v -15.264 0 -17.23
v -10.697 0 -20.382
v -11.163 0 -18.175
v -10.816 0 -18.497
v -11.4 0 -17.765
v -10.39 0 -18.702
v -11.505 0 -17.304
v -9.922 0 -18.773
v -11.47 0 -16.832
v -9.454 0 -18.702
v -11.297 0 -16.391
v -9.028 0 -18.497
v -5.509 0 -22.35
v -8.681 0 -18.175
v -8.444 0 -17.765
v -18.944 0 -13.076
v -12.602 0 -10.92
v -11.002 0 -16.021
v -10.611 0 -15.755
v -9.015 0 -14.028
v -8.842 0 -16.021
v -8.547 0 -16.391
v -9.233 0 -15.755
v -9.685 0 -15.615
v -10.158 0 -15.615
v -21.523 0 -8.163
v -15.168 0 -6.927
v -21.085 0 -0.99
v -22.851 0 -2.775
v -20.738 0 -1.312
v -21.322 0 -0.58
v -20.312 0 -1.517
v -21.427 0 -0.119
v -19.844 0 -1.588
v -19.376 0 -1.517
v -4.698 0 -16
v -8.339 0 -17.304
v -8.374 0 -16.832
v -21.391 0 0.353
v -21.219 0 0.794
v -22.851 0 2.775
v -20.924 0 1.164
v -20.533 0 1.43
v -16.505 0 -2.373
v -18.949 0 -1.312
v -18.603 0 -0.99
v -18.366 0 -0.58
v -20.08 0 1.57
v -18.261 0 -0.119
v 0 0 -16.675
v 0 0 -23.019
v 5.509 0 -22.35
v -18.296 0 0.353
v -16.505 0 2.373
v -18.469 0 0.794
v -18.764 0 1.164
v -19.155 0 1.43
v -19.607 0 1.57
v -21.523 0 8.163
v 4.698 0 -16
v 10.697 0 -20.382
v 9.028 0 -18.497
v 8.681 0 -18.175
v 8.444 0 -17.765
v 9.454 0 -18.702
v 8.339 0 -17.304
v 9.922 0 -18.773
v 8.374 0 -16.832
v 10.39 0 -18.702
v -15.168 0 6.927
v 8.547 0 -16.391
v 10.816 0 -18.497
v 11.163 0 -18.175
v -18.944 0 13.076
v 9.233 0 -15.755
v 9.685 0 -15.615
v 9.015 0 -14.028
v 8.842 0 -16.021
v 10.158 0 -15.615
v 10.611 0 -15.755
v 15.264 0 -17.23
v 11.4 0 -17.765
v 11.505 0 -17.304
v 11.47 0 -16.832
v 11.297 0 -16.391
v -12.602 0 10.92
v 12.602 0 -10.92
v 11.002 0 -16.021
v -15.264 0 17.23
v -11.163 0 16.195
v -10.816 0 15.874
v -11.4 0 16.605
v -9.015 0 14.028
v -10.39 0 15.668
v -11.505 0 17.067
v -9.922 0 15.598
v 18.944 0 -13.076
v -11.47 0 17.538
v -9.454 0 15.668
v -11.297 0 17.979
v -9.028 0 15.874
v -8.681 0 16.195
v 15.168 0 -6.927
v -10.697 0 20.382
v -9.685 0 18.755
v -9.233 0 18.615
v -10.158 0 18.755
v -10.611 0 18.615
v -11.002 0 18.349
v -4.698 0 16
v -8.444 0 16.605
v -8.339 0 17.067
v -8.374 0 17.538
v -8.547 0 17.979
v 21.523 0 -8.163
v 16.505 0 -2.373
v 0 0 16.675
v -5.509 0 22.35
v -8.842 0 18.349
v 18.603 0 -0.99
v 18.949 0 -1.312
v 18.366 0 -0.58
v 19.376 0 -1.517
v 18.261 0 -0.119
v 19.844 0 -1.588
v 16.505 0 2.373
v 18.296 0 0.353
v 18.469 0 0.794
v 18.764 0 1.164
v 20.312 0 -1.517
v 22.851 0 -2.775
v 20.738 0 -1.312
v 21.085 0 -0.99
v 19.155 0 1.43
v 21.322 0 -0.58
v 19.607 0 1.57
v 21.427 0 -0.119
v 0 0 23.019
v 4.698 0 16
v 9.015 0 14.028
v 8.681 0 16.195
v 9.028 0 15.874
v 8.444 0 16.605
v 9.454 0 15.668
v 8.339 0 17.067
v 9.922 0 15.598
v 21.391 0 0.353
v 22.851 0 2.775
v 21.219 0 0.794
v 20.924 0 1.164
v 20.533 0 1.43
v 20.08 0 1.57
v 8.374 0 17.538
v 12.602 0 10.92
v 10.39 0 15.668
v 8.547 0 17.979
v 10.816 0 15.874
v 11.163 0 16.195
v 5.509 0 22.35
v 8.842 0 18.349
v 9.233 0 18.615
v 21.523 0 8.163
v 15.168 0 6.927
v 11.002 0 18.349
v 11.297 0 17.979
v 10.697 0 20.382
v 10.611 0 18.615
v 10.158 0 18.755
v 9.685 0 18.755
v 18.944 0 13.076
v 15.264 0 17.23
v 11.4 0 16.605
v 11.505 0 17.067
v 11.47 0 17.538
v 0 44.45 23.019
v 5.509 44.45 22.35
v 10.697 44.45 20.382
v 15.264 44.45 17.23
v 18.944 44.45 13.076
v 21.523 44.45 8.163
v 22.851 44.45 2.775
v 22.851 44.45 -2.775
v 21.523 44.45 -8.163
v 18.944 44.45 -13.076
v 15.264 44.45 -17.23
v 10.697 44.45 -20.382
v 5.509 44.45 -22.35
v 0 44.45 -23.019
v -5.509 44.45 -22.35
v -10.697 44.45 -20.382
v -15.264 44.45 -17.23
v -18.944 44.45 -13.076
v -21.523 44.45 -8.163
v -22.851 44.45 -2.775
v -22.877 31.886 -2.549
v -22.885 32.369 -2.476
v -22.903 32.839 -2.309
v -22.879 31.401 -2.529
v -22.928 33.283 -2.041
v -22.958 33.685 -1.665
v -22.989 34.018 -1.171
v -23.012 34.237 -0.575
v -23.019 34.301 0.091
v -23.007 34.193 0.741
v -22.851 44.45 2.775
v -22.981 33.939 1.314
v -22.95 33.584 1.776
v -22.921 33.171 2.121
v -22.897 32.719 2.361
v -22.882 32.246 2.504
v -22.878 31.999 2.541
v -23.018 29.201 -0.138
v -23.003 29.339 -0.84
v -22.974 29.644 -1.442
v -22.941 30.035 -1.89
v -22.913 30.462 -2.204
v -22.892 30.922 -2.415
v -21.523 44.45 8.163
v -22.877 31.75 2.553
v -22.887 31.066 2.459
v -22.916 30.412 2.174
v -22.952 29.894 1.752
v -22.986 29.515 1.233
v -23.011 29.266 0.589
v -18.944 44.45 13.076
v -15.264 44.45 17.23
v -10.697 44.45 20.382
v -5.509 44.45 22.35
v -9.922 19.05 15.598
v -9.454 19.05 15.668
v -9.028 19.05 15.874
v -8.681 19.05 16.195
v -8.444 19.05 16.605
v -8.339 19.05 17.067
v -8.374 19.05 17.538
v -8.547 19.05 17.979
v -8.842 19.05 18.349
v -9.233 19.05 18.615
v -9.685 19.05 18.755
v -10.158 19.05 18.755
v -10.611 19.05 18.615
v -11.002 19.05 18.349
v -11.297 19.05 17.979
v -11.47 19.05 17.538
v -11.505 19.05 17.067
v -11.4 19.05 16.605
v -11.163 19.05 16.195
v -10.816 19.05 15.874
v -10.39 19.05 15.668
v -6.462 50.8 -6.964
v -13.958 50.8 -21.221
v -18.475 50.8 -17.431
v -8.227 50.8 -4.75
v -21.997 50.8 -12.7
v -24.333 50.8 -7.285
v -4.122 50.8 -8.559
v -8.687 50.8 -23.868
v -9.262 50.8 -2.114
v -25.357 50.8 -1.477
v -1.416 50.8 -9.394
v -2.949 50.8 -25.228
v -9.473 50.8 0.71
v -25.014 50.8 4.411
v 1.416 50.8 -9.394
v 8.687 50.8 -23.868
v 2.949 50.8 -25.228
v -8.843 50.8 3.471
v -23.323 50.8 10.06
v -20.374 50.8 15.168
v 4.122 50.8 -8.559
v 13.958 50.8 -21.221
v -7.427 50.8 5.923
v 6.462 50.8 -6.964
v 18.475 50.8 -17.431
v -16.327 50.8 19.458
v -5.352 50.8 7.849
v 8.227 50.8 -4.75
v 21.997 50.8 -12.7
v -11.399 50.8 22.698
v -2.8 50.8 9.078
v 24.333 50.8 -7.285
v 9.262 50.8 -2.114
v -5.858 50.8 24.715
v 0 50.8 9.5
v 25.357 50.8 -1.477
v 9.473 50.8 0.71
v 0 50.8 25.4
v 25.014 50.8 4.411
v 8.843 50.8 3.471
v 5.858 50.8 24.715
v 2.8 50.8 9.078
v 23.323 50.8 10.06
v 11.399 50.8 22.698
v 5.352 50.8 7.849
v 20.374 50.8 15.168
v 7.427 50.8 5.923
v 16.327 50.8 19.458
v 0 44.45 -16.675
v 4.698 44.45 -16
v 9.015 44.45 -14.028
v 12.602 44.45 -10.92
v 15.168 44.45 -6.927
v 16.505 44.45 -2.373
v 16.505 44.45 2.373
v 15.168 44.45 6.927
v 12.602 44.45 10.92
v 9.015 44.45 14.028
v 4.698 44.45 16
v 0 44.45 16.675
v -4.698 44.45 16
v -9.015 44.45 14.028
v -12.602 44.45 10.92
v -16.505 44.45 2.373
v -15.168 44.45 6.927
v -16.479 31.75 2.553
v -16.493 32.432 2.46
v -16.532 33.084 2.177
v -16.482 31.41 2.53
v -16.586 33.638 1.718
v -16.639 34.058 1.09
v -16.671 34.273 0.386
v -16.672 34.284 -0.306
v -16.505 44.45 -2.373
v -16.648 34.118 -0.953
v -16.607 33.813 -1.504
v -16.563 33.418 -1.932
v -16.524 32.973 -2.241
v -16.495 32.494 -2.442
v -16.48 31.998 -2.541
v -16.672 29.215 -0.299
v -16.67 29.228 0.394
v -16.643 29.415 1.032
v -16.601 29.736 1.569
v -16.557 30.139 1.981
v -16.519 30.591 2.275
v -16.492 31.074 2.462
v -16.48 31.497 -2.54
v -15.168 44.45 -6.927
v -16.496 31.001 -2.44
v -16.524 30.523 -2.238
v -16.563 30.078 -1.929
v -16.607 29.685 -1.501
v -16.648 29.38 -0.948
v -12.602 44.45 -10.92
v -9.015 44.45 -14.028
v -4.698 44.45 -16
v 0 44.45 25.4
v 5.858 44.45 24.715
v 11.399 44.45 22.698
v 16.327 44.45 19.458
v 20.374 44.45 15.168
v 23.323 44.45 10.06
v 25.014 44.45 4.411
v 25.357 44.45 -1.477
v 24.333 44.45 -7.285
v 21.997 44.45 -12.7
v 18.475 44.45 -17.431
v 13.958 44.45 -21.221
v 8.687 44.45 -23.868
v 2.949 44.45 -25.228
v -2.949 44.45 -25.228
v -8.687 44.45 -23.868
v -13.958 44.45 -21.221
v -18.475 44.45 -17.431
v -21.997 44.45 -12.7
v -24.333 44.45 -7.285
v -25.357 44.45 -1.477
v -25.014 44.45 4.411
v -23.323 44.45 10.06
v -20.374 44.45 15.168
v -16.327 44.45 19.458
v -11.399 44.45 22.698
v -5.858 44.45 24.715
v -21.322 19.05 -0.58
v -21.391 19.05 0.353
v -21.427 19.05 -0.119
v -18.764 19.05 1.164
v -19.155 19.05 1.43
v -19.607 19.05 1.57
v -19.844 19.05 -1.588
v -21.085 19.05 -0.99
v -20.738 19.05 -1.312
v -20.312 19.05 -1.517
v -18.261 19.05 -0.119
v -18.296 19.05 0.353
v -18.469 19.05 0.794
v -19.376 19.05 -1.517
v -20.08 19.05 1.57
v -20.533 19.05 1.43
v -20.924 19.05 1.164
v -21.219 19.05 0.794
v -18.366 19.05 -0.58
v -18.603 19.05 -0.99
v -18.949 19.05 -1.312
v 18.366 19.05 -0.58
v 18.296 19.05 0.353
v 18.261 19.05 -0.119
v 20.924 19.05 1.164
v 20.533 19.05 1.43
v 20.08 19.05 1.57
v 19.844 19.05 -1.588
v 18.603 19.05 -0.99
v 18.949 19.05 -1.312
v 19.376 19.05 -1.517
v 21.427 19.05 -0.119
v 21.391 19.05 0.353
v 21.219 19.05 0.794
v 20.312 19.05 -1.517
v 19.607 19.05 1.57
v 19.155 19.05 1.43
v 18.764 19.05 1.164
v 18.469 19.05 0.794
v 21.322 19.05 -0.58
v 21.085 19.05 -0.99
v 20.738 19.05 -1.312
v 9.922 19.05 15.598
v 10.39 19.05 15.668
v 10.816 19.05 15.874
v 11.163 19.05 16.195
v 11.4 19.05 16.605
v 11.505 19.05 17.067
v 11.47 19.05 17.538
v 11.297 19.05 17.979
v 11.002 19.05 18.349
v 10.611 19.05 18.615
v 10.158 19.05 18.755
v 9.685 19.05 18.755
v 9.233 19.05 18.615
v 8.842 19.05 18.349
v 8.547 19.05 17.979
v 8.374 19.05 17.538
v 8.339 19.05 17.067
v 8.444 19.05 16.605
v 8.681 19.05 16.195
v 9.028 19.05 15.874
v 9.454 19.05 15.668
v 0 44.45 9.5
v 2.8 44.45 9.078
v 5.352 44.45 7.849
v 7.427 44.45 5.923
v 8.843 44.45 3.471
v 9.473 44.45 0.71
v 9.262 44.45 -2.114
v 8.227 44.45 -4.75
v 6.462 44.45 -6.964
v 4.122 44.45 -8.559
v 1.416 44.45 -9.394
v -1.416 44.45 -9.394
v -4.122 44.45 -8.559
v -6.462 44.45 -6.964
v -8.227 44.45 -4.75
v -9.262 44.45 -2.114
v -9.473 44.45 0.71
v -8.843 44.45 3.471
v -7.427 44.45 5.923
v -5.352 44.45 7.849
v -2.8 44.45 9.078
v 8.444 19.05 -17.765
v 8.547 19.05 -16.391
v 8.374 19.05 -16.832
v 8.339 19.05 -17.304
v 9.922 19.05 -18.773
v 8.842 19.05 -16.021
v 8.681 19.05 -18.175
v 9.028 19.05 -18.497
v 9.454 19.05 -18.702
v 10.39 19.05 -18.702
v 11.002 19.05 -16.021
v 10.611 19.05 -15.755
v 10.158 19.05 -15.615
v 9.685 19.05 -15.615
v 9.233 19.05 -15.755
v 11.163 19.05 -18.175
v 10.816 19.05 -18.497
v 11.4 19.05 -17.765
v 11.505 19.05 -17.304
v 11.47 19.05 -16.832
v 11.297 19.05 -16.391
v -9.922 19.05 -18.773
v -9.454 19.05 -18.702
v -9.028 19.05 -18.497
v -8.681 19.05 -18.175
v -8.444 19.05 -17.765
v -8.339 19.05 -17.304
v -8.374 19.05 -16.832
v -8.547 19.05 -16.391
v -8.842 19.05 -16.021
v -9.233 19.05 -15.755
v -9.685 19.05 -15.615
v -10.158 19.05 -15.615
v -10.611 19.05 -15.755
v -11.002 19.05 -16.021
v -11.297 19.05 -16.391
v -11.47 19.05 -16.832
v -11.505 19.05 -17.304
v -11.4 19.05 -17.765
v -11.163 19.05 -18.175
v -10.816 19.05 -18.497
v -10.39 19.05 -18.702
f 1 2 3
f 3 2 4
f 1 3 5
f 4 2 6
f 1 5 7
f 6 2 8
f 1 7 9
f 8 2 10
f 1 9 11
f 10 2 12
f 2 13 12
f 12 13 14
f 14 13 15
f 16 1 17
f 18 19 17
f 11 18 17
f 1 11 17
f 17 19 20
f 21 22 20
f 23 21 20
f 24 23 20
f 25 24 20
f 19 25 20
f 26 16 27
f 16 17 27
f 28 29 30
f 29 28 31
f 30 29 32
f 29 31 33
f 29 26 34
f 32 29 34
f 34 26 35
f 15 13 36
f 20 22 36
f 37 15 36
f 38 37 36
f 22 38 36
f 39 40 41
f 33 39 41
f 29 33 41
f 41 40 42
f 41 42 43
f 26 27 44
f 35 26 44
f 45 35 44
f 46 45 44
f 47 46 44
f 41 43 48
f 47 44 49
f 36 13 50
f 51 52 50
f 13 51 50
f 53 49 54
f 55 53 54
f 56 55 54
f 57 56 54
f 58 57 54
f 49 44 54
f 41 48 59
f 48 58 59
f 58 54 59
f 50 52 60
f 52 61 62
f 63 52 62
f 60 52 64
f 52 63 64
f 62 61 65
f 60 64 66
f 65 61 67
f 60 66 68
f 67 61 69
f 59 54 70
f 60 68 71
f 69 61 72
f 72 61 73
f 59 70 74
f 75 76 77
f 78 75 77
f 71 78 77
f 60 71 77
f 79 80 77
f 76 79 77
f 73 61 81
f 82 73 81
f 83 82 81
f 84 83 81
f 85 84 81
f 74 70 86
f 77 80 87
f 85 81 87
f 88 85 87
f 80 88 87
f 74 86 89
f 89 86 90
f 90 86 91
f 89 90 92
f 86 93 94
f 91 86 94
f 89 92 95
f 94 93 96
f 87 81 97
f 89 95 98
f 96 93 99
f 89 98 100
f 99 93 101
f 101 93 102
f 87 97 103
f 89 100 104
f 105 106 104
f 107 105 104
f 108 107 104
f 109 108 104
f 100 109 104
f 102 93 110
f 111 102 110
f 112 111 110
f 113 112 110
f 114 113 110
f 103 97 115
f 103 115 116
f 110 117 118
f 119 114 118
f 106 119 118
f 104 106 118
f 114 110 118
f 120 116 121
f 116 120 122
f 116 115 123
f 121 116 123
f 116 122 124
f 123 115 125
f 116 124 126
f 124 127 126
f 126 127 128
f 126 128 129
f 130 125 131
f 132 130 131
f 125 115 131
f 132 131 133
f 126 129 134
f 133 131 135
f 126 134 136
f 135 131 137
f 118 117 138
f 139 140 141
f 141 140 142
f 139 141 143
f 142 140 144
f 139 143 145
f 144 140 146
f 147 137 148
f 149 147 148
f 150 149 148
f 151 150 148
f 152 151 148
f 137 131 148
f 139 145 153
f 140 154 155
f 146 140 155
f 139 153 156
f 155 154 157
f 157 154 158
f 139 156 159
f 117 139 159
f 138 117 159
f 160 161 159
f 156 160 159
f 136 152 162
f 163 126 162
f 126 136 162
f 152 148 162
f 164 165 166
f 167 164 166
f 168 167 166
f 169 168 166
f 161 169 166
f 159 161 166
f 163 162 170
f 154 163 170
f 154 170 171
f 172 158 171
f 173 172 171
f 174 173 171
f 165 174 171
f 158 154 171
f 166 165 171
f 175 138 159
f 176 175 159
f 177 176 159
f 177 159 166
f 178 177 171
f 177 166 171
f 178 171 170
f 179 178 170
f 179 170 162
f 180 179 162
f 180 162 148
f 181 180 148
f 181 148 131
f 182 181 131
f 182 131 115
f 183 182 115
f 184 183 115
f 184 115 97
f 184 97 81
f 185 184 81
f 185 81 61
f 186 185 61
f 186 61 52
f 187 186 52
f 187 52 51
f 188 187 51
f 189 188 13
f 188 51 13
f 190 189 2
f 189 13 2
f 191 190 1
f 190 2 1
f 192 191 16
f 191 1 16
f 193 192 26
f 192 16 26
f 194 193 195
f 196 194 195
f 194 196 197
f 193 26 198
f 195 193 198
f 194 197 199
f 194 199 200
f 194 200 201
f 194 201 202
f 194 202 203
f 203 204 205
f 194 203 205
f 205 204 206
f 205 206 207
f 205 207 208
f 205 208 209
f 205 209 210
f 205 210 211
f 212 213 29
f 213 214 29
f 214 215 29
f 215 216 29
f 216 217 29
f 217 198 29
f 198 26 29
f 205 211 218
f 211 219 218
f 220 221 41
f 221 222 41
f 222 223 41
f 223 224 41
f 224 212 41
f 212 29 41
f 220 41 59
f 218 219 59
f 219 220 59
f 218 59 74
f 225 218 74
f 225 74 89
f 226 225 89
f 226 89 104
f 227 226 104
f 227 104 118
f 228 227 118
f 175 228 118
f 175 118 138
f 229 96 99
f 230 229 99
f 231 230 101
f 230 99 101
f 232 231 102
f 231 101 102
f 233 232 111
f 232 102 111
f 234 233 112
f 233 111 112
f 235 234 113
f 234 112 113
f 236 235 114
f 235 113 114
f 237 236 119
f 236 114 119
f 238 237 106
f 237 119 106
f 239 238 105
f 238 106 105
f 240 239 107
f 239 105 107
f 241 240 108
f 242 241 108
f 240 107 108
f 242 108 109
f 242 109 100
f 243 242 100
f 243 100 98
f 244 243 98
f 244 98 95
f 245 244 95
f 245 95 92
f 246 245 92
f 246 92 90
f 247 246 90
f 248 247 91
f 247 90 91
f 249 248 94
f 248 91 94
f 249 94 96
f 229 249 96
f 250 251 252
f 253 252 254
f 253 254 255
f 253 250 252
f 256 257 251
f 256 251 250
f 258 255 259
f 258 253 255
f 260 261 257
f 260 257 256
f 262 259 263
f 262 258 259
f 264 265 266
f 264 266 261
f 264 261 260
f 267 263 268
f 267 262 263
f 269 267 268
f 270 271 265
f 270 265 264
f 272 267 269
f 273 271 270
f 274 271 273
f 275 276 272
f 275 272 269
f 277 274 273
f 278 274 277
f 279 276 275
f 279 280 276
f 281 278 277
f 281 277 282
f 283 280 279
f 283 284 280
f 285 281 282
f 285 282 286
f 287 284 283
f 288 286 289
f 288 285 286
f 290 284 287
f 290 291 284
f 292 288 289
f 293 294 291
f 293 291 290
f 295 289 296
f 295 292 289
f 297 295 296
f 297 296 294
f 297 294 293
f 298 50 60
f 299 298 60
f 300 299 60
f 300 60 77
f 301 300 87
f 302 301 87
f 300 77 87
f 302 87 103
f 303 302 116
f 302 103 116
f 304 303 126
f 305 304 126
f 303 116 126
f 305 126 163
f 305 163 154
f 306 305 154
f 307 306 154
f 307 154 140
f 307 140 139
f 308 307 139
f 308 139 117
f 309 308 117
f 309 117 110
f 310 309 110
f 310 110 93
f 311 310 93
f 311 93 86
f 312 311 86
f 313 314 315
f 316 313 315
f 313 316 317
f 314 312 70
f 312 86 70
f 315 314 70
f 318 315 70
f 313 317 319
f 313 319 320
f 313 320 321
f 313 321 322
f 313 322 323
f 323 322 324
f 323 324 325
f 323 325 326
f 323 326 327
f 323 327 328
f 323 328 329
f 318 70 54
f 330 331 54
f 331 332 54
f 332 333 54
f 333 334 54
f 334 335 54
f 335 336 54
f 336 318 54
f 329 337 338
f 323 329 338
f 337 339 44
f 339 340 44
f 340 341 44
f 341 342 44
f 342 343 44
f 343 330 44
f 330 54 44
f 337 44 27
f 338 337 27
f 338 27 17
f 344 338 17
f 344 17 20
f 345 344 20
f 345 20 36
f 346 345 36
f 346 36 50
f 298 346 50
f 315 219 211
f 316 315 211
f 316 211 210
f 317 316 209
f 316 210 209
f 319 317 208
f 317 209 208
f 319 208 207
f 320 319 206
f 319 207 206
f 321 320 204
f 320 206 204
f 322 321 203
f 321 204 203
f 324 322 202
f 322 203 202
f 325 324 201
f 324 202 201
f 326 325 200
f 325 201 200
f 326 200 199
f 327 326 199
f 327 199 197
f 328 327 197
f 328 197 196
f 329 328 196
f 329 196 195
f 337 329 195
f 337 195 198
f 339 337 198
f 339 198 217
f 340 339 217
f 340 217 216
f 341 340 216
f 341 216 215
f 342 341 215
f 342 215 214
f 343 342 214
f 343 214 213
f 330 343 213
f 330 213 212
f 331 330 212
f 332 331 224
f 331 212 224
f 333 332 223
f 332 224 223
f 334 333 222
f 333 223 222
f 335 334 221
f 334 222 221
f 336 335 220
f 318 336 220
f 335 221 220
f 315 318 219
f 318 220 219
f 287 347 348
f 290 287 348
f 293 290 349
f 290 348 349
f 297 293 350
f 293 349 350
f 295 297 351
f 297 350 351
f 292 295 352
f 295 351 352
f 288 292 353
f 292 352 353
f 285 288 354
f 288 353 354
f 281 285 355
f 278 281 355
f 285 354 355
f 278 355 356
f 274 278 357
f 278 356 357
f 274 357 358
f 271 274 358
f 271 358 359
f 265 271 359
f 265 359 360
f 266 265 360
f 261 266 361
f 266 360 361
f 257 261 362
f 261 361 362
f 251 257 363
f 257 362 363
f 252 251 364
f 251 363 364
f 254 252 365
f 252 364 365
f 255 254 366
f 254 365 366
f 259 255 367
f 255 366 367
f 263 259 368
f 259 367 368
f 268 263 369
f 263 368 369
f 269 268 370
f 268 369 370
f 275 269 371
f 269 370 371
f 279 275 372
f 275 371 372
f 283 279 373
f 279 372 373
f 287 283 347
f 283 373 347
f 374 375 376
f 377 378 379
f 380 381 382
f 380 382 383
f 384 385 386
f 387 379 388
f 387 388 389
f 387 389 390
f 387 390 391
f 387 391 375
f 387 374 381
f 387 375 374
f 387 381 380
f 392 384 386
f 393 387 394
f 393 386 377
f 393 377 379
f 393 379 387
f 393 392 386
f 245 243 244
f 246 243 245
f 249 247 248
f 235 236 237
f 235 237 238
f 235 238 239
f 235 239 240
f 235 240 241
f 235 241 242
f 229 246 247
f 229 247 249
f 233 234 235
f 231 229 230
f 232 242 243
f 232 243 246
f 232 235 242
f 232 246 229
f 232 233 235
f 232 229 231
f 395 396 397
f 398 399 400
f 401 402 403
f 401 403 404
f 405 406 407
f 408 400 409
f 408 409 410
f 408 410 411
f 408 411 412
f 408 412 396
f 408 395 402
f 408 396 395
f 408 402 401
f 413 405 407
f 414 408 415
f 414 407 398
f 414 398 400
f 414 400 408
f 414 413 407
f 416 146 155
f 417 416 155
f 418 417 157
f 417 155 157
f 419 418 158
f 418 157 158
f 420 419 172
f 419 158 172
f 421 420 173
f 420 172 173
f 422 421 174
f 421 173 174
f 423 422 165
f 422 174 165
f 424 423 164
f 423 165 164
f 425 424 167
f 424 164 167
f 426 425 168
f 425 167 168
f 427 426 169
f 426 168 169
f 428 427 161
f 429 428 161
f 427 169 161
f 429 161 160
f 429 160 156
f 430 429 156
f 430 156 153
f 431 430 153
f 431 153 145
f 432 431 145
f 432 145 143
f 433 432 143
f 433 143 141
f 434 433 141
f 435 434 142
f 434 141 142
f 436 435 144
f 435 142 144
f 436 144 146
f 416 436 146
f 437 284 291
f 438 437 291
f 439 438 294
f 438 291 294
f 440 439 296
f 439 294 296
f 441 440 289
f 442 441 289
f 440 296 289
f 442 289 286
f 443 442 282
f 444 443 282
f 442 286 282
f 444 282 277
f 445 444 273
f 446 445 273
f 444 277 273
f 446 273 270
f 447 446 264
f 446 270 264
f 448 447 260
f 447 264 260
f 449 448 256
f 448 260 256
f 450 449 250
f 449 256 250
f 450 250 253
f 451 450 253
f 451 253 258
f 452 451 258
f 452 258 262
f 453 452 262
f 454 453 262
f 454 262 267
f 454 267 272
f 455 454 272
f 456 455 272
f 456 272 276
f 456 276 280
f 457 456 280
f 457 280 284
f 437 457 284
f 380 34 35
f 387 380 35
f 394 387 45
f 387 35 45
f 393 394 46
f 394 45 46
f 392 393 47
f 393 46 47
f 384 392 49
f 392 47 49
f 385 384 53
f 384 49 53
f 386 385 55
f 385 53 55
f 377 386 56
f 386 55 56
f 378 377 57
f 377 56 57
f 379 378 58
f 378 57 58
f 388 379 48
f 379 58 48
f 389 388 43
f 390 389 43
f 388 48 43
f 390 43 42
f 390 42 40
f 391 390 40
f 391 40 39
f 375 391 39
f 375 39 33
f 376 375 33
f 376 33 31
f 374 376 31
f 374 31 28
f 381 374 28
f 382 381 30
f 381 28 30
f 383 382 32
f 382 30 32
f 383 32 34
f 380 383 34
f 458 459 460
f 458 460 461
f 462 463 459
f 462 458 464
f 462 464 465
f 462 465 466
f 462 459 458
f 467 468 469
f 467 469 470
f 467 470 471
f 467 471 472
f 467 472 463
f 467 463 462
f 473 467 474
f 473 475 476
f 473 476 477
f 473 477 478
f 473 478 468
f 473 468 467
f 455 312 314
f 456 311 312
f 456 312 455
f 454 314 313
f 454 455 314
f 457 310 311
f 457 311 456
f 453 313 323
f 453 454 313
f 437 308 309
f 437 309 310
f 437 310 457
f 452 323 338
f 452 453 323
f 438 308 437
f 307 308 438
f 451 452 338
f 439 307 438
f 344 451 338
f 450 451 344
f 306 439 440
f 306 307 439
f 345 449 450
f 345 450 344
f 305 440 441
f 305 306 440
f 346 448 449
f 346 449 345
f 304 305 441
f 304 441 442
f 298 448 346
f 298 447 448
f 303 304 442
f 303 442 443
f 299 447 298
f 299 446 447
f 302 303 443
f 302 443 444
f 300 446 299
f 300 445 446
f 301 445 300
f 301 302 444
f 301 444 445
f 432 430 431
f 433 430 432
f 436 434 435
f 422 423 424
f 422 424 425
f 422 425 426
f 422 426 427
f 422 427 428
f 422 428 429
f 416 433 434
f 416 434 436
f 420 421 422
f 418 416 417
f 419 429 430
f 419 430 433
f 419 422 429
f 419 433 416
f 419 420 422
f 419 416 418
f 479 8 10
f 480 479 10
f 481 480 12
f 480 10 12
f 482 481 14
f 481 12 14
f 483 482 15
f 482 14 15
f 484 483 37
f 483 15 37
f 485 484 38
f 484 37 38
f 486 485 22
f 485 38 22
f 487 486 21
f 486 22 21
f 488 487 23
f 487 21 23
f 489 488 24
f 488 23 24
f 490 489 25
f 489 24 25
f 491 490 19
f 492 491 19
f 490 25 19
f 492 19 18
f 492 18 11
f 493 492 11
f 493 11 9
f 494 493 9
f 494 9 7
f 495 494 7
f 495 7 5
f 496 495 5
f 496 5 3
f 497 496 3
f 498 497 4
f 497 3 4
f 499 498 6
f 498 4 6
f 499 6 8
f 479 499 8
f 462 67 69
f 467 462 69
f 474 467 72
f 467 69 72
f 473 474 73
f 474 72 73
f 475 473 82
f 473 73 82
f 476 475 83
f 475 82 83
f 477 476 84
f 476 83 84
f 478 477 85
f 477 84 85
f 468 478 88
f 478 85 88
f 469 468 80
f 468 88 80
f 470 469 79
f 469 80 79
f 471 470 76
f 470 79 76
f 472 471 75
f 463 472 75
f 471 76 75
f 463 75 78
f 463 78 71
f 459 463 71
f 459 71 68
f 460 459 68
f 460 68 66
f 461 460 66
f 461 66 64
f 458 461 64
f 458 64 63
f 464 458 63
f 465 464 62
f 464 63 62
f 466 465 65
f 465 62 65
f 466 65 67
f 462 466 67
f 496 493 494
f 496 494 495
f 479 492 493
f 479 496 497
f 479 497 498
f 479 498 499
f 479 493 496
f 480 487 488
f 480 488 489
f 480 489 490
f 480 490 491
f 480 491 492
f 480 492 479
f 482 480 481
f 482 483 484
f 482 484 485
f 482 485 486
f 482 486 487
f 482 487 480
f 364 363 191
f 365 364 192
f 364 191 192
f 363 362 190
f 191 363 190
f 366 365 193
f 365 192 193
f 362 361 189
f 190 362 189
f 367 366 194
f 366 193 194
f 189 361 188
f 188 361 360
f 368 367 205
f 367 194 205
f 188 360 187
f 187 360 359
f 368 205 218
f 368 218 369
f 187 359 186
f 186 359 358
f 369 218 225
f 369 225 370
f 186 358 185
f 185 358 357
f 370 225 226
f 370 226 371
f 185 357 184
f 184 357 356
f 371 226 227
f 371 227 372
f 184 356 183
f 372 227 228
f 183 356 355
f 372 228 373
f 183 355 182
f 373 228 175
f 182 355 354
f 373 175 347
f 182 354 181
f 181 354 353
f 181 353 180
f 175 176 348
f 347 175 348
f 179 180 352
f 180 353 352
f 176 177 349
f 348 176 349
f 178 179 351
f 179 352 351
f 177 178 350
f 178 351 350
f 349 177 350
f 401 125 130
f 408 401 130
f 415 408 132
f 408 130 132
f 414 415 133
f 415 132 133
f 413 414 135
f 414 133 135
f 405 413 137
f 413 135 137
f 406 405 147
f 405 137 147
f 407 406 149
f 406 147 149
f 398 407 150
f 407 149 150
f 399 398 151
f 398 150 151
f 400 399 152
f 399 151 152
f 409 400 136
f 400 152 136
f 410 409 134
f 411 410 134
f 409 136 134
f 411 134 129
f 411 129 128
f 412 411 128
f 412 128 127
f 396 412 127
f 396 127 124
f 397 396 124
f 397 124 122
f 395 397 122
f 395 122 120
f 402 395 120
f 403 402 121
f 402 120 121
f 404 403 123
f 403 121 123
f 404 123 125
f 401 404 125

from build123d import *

# Parameters (mm, degrees)
SKETCH1_R                        = 23.01875
BOSS_EXTRUDE1_DEPTH              = 44.45
SKETCH2_R                        = 25.4
BOSS_EXTRUDE2_DEPTH              = 6.35
SKETCH3_R                        = 9.5
CUT_EXTRUDE1_DEPTH               = 63.217039467
SKETCH4_R                        = 16.6751
CUT_EXTRUDE2_DEPTH               = 44.45
SKETCH5_R                        = 1.5875
CUT_EXTRUDE3_DEPTH               = 19.05
TAP_DRILL_FOR_1_4_20_TAP1_REACH  = 76.634
TAP_DRILL_FOR_1_4_20_TAP1_BORE_R = 2.5527


with BuildPart() as part:
    # Sketch1 → Boss-Extrude1 (new body)
    with BuildSketch(Plane(origin=(0, 0, 0), x_dir=(1, 0, 0), z_dir=(0, 1, 0))):
        with Locations(Location((0, 0, 0), (0, 0, 270))):
            Circle(SKETCH1_R)
    extrude(amount=BOSS_EXTRUDE1_DEPTH)

    # Sketch2 → Boss-Extrude2 (add)
    with BuildSketch(Plane(origin=(0, 44.45, 0), x_dir=(1, 0, 0), z_dir=(0, 1, 0))):
        with Locations(Location((0, 0, 0), (0, 0, 270))):
            Circle(SKETCH2_R)
    extrude(amount=BOSS_EXTRUDE2_DEPTH)

    # Sketch3 → Cut-Extrude1 (cut, through all)
    with BuildSketch(Plane(origin=(0, 50.8, 0), x_dir=(1, 0, 0), z_dir=(0, 1, 0))):
        with Locations(Location((0, 0, 0), (0, 0, 270))):
            Circle(SKETCH3_R)
    extrude(amount=-CUT_EXTRUDE1_DEPTH, mode=Mode.SUBTRACT)

    # Sketch4 → Cut-Extrude2 (cut)
    with BuildSketch(Plane.XZ):
        with Locations(Location((0, 0, 0), (0, 0, 270))):
            Circle(SKETCH4_R)
    extrude(amount=-CUT_EXTRUDE2_DEPTH, mode=Mode.SUBTRACT)

    # Sketch5 → Cut-Extrude3 (cut)
    with BuildSketch(Plane.XZ):
        with Locations(Location((19.84375, 0, 0), (0, 0, 270))):
            Circle(SKETCH5_R)
        with Locations(Location((9.921875, -17.185191606, 0), (0, 0, 270))):
            Circle(SKETCH5_R)
        with Locations(Location((-9.921875, -17.185191606, 0), (0, 0, 270))):
            Circle(SKETCH5_R)
        with Locations(Location((-19.84375, 0, 0), (0, 0, 270))):
            Circle(SKETCH5_R)
        with Locations(Location((-9.921875, 17.185191606, 0), (0, 0, 270))):
            Circle(SKETCH5_R)
        with Locations(Location((9.921875, 17.185191606, 0), (0, 0, 270))):
            Circle(SKETCH5_R)
    extrude(amount=-CUT_EXTRUDE3_DEPTH, mode=Mode.SUBTRACT)

    # Tap Drill for 1/4-20 Tap1 bore → Tap Drill for 1/4-20 Tap1 (cut, up to next)
    with BuildSketch(Plane.ZY.offset(23.01875), mode=Mode.PRIVATE) as tap_drill_for_1_4_20_tap1_sk1:
        with Locations((0, 31.75)):
            Circle(TAP_DRILL_FOR_1_4_20_TAP1_BORE_R)
    tap_drill_for_1_4_20_tap1_tool1 = extrude(tap_drill_for_1_4_20_tap1_sk1.sketch, amount=-TAP_DRILL_FOR_1_4_20_TAP1_REACH, mode=Mode.PRIVATE) & part.part
    add(tap_drill_for_1_4_20_tap1_tool1.solids().sort_by_distance((-23.01875, 31.75, 0))[0], mode=Mode.SUBTRACT)


solid = part.part
